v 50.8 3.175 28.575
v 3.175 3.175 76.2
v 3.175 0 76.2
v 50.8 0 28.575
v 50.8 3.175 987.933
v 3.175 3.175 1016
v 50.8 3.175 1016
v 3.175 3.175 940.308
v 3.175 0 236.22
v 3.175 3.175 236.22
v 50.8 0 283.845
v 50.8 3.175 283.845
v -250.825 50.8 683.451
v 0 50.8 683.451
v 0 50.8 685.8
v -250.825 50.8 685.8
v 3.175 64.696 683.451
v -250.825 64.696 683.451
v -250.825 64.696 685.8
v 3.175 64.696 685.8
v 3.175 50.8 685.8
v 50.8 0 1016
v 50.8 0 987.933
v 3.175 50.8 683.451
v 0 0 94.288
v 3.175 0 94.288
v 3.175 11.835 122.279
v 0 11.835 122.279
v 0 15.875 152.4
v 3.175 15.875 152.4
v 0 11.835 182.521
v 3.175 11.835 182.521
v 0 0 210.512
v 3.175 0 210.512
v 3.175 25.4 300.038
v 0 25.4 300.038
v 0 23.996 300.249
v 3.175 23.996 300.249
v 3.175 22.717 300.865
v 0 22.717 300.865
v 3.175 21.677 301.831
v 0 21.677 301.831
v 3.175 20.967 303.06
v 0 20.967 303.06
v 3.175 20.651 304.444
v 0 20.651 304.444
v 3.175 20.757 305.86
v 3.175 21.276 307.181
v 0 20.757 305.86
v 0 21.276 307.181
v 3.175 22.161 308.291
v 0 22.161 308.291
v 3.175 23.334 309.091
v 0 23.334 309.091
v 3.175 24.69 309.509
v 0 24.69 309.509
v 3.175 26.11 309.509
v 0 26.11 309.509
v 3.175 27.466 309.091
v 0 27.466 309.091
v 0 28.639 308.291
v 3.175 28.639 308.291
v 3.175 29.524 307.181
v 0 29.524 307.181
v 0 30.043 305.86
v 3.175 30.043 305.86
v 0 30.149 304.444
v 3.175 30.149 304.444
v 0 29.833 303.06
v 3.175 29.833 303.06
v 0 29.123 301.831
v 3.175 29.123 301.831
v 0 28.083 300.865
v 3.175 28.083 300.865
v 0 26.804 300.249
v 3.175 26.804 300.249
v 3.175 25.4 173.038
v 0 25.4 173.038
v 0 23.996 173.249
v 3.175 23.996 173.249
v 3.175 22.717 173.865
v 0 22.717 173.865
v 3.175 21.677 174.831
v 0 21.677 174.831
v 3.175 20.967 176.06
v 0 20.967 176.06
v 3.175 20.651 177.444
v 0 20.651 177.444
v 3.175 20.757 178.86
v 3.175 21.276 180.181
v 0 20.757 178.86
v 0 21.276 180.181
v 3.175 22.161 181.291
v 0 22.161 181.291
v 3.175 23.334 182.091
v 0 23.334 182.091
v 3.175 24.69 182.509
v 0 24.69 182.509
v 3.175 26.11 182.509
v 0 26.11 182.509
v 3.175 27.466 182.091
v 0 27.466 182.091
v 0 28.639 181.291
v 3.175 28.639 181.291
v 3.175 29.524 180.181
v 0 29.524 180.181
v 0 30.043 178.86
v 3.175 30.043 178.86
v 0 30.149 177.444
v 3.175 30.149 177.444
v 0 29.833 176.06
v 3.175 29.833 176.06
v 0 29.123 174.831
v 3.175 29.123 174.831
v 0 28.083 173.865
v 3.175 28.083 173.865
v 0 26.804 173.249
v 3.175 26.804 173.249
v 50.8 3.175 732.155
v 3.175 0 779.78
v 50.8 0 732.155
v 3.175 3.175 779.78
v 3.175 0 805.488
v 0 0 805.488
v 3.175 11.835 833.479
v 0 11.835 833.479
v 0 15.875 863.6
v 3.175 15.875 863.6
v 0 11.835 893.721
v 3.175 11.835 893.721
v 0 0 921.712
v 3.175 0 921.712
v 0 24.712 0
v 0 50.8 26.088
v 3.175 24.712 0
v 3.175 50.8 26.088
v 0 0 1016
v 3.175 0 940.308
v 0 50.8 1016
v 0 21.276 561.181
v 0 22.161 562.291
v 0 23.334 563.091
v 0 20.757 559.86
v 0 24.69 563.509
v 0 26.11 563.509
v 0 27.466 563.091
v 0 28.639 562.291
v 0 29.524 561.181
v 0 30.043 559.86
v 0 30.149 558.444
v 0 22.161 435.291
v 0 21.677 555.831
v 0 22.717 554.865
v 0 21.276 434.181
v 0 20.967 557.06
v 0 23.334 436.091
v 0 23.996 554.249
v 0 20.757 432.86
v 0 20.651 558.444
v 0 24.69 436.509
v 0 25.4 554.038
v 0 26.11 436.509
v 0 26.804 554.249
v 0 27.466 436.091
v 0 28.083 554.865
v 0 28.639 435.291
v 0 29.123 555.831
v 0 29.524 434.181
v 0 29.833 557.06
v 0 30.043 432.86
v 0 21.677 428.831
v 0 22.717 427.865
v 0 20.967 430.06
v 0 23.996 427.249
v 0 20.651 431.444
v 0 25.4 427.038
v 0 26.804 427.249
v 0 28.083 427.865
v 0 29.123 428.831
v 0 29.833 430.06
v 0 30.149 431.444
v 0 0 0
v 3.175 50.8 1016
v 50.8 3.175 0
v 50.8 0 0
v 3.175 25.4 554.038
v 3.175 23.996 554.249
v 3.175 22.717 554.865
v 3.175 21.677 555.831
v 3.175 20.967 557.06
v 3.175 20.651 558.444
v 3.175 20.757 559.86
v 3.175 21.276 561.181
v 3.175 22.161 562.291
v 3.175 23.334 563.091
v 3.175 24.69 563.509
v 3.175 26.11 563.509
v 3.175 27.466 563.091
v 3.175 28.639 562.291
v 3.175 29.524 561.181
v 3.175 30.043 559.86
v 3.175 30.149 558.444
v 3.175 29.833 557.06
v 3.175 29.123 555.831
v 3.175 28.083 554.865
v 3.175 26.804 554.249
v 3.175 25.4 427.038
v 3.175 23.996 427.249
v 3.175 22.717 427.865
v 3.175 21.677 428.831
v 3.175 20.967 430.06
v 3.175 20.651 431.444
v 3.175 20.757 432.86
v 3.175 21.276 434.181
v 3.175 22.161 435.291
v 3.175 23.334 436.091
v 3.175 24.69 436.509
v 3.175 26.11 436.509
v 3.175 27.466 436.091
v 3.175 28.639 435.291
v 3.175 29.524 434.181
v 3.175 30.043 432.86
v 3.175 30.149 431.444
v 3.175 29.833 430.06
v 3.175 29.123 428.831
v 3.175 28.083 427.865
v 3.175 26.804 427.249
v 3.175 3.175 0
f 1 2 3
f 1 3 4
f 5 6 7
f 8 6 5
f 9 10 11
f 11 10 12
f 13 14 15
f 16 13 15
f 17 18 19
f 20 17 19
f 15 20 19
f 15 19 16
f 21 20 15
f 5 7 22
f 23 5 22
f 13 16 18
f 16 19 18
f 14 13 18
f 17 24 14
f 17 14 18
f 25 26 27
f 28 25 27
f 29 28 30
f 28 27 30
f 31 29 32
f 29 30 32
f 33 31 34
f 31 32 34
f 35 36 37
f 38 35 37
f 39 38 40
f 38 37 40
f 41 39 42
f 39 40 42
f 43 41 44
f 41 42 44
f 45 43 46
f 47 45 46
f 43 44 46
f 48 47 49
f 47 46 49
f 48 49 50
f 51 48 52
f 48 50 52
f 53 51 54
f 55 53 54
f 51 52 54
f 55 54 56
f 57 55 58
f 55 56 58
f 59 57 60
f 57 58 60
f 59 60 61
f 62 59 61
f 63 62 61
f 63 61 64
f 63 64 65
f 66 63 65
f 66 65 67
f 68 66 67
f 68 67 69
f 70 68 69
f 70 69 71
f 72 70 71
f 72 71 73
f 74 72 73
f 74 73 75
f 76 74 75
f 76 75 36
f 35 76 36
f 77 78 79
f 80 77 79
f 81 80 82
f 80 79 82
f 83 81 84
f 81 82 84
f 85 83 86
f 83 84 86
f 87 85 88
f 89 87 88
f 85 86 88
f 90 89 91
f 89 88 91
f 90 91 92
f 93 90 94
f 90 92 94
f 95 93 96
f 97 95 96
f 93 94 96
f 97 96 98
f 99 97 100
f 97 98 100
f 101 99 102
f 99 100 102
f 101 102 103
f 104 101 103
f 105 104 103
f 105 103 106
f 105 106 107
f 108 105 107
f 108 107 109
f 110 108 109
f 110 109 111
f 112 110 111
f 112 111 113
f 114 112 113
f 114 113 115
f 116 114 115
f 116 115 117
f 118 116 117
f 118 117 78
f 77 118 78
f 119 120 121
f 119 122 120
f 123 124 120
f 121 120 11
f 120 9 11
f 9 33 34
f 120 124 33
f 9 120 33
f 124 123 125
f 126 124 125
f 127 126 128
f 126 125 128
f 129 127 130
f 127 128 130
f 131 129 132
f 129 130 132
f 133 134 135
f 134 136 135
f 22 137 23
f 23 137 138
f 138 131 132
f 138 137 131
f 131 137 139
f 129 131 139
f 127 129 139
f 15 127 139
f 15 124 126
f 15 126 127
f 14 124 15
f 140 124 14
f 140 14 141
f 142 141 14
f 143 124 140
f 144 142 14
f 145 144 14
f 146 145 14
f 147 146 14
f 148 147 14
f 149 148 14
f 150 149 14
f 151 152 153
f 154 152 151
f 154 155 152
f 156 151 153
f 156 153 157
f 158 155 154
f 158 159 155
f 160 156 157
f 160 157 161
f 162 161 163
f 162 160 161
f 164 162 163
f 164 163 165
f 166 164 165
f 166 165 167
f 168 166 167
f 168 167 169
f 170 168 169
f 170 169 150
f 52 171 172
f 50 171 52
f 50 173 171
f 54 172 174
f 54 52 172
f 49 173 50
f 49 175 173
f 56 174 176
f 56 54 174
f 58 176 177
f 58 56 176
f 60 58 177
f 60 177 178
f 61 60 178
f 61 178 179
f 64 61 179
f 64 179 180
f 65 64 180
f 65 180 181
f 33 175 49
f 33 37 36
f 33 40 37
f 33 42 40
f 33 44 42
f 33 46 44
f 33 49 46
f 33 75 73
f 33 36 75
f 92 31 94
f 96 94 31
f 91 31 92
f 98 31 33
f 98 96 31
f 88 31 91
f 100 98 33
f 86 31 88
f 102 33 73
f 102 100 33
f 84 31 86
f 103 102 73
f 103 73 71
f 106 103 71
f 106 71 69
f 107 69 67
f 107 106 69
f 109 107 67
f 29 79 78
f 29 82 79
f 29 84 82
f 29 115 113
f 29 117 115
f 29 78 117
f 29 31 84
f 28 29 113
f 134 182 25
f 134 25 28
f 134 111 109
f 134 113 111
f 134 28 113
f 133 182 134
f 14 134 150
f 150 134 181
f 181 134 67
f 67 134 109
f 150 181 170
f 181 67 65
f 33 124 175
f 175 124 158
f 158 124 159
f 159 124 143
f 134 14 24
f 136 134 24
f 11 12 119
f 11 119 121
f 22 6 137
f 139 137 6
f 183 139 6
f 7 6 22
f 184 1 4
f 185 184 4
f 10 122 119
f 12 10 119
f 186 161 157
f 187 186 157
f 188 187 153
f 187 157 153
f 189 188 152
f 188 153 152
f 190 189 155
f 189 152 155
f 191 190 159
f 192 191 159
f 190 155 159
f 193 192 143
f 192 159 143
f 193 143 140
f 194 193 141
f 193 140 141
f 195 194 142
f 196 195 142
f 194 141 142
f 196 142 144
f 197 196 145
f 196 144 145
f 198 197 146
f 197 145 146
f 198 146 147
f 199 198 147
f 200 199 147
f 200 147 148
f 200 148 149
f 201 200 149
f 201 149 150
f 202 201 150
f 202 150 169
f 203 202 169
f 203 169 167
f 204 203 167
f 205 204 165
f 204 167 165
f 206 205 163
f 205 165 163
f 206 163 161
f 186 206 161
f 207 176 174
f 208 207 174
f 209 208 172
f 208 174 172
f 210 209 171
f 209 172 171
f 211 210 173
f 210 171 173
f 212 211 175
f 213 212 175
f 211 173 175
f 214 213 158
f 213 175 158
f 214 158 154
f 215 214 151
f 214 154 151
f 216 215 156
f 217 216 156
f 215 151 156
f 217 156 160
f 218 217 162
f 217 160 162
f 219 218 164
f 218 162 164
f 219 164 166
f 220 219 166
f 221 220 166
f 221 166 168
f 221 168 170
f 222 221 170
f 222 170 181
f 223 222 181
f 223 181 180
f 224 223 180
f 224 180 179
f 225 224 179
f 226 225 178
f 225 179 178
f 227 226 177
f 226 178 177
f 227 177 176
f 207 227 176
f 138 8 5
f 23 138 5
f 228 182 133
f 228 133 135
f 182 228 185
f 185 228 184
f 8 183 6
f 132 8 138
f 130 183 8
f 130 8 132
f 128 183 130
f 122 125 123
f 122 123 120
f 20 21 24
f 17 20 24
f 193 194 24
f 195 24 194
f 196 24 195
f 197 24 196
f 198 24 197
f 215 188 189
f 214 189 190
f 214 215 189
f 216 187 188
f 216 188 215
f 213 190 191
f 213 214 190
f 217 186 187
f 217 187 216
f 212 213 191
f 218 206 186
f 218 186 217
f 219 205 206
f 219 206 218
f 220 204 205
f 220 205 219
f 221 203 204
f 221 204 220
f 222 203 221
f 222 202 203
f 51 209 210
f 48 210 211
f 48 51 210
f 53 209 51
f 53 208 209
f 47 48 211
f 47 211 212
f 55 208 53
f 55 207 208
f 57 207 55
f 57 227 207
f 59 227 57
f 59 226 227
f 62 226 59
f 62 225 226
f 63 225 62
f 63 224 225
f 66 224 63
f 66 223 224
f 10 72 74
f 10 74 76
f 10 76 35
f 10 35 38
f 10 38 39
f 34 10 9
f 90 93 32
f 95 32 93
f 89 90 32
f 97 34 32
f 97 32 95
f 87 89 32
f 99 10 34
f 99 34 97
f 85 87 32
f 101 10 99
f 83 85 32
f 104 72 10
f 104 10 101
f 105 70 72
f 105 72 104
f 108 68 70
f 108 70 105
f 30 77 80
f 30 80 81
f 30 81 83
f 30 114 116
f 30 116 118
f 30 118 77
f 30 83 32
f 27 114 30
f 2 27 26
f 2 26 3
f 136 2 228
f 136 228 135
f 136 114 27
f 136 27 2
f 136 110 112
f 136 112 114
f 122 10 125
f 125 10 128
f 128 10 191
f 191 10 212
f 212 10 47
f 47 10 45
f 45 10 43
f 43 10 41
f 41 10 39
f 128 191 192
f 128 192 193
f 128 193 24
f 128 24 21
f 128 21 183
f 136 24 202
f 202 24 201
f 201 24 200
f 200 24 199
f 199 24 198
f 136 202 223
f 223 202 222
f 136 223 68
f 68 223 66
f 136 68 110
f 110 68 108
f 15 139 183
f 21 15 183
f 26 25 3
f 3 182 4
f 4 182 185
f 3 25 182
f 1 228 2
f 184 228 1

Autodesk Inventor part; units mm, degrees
ref_plane "YZ Plane" through (0, 0, 0) normal (1, 0, 0) x (0, 1, 0)
ref_plane "XZ Plane" through (0, 0, 0) normal (0, 1, 0) x (-1, 0, 0)
ref_plane "XY Plane" through (0, 0, 0) normal (0, 0, 1) x (1, 0, 0)
sketch "Sketch1" plane through (0, 0, 0) normal (0, 0, 1) x (1, 0, 0)
  line L0 (0, 0) -> (0, 50.8)
  line L1 (0, 0) -> (50.8, 0)
  line L2 (3.175, 50.8) -> (3.175, 3.175)
  line L3 (3.175, 3.175) -> (50.8, 3.175)
  line L4 (0, 50.8) -> (3.175, 50.8)
  line L5 (50.8, 3.175) -> (50.8, 0)
  dimension "d0" = 50.8
  dimension "d1" = 50.8
  dimension "d2" = 3.175
extrude "Extrusion1" add sketch "Sketch1" along normal blind 1016
sketch "Sketch2" plane through (3.175, 3.175, 0) normal (0, 1, 0) x (1, 0, 0)
  line L0 (-3.175, 0) -> (-3.175, -1016) projected
  line L1 (47.625, -1016) -> (-3.175, -1016)
  line L2 (-3.175, -1016) -> (-3.175, -990.6)
  line L3 (-3.175, -990.6) -> (47.625, -990.6)
  line L4 (47.625, -990.6) -> (47.625, -1016)
  line L5 (0, 0) -> (0, -1016) projected
  line L6 (47.625, 0) -> (47.625, -1016) projected
  line L7 (0, -990.6) -> (47.625, -990.6)
  line L8 (47.625, -990.6) -> (47.625, -830.58)
  line L9 (47.625, -830.58) -> (0, -830.58)
  line L10 (0, -830.58) -> (0, -990.6)
  line L11 (47.625, 0) -> (0, 0)
  line L12 (0, 0) -> (0, -25.4)
  line L13 (0, -25.4) -> (47.625, -25.4)
  line L14 (47.625, -25.4) -> (47.625, 0)
  line L15 (47.625, -25.4) -> (0, -25.4)
  line L16 (0, -25.4) -> (0, -185.42)
  line L17 (0, -185.42) -> (47.625, -185.42)
  line L18 (47.625, -185.42) -> (47.625, -25.4)
  dimension "d5" = 25.4
  dimension "d6" = 160.02
  dimension "d7" = 25.4
  dimension "d8" = 160.02
extrude "Extrusion2" cut sketch "Sketch2" against normal blind 1016 contours L5 L9 L6 L3 | L5 L13 L6 L17
sketch "Sketch5" plane through (3.175, 3.175, 185.42) normal (0, 1, 0) x (1, 0, 0)
  line L0 (47.625, 0) -> (47.625, -645.16) projected
  line L1 (0, 0) -> (47.625, 0)
  line L2 (47.625, 0) -> (47.625, -50.8)
  line L3 (47.625, -50.8) -> (0, -50.8)
  line L4 (0, -50.8) -> (0, 0)
  line L5 (0, 0) -> (0, -645.16) projected
  line L6 (47.625, -645.16) -> (0, -645.16)
  line L7 (0, -645.16) -> (0, -594.36)
  line L8 (0, -594.36) -> (47.625, -594.36)
  line L9 (47.625, -594.36) -> (47.625, -645.16)
  point P0 (-3.175, 185.42)
  dimension "d21" = 50.8
  dimension "d22" = 50.8
extrude "Extrusion4" cut sketch "Sketch5" against normal blind 1016 contours L0 L3 L4 L1 | L0 L6 L5 L8
sketch "Sketch6" plane through (3.175, 3.175, 0) normal (1, 0, 0) x (0, 0, -1)
  circle A0 centre (-152.4, -101.6) radius 114.3
  circle A1 centre (-863.6, -101.6) radius 114.3
  point P0 (0, -3.175)
  dimension "d25" = 228.6
extrude "Extrusion5" cut sketch "Sketch6" against normal blind 1016
sketch "Sketch7" plane through (3.175, 3.175, 1016) normal (0, 1, 0) x (1, 0, 0)
  line L0 (0, 990.6) -> (0, 921.712) projected
  line L1 (47.625, 990.6) -> (0, 990.6)
  line L2 (0, 990.6) -> (0, 939.8)
  line L3 (0, 939.8) -> (47.625, 939.8)
  line L4 (47.625, 939.8) -> (47.625, 990.6)
  line L5 (0, 94.288) -> (0, 25.4) projected
  line L6 (47.625, 24.8924) -> (0, 24.8924)
  line L7 (0, 24.8924) -> (0, 75.6924)
  line L8 (0, 75.6924) -> (47.625, 75.6924)
  line L9 (47.625, 75.6924) -> (47.625, 24.8924)
  point P0 (-3.175, 1016)
  dimension "d28" = 50.8
  dimension "d29" = 50.8
extrude "Extrusion6" add sketch "Sketch7" against normal blind 3.175
sketch "Sketch8" plane through (3.175, 3.175, 0) normal (1, 0, 0) x (0, 0, -1)
  line L0 (0, 47.625) -> (-1016, 47.625) projected
  line L1 (-26.088, 47.625) -> (2.2813, 19.2557)
  line L2 (-26.088, 47.625) -> (14.0323, 47.625) construction
  line L3 (2.2813, 19.2557) -> (0, 47.625)
  line L4 (0, 47.625) -> (-26.088, 47.625)
  point P0 (0, -3.175)
  dimension "d32" = 45
extrude "Extrusion7" cut sketch "Sketch8" against normal blind 3.175
sketch "Sketch9" plane through (3.175, 3.175, 1016) normal (1, 0, 0) x (0, 0, -1)
  line L0 (989.912, 47.625) -> (0, 47.625) projected
  line L1 (330.2, 47.625) -> (330.2, -3.175)
  point P0 (1016, -3.175)
  point P1 (330.2, 23.8125)
  point P2 (838.2, 22.225)
  point P3 (711.2, 22.225)
  point P4 (584.2, 22.225)
  point P5 (457.2, 22.225)
hole "Hole2" at (3.175, 25.4, 177.8) at (3.175, 25.4, 304.8) at (3.175, 25.4, 431.8) at (3.175, 25.4, 558.8) direction (-1, 0, 0) diameter 9.525 end through all
sketch "Sketch10" plane through (3.175, 3.175, 1016) normal (0, 1, 0) x (1, 0, 0)
  line L0 (0, 75.6924) -> (43.0144, 32.678)
  line L1 (0, 75.6924) -> (60.8315, 75.6924) construction
  line L2 (43.0144, 32.678) -> (47.625, 28.0674)
  line L3 (47.625, 75.6924) -> (47.625, 0) projected
  line L4 (47.625, 75.6924) -> (0, 75.6924)
  line L5 (0, 94.288) -> (0, 75.6924) projected
  line L6 (0, 236.22) -> (70.4888, 306.7088)
  line L7 (0, 236.22) -> (99.6862, 236.22) construction
  line L8 (70.4888, 306.7088) -> (70.4888, 236.22)
  line L9 (70.4888, 236.22) -> (0, 236.22)
  line L10 (0, 779.78) -> (0, 236.22) projected
  line L11 (0, 779.78) -> (47.625, 732.155)
  line L12 (47.625, 732.155) -> (47.625, 779.78)
  line L13 (47.625, 779.78) -> (47.625, 236.22) projected
  line L14 (47.625, 779.78) -> (0, 779.78)
  line L15 (0, 939.8) -> (47.625, 987.425)
  line L16 (47.625, 1016) -> (47.625, 939.8) projected
  line L17 (47.625, 939.8) -> (0, 939.8)
  point P0 (-3.175, 1016)
  dimension "d42" = 45
  dimension "d43" = 45
extrude "Extrusion8" cut sketch "Sketch10" against normal blind 25.4 contours L4 L3 L2 L0 | L6 L13 L9 | L6 L8 L9 L13 | L14 L12 L11 | L15 L16 L17
sketch "Sketch11" plane through (3.175, 3.175, 1016) normal (1, 0, 0) x (0, 0, -1)
  line L0 (989.912, 47.625) -> (0, 47.625) projected
  line L1 (330.2, 47.625) -> (332.5489, 47.625)
  line L2 (332.5489, 47.625) -> (332.5489, 61.5215)
  line L3 (332.5489, 61.5215) -> (330.2, 61.5215)
  line L4 (330.2, 61.5215) -> (330.2, 47.625)
  point P0 (1016, -3.175)
extrude "Extrusion9" add sketch "Sketch11" against normal blind 254
properties part number "Conveyor Support"
